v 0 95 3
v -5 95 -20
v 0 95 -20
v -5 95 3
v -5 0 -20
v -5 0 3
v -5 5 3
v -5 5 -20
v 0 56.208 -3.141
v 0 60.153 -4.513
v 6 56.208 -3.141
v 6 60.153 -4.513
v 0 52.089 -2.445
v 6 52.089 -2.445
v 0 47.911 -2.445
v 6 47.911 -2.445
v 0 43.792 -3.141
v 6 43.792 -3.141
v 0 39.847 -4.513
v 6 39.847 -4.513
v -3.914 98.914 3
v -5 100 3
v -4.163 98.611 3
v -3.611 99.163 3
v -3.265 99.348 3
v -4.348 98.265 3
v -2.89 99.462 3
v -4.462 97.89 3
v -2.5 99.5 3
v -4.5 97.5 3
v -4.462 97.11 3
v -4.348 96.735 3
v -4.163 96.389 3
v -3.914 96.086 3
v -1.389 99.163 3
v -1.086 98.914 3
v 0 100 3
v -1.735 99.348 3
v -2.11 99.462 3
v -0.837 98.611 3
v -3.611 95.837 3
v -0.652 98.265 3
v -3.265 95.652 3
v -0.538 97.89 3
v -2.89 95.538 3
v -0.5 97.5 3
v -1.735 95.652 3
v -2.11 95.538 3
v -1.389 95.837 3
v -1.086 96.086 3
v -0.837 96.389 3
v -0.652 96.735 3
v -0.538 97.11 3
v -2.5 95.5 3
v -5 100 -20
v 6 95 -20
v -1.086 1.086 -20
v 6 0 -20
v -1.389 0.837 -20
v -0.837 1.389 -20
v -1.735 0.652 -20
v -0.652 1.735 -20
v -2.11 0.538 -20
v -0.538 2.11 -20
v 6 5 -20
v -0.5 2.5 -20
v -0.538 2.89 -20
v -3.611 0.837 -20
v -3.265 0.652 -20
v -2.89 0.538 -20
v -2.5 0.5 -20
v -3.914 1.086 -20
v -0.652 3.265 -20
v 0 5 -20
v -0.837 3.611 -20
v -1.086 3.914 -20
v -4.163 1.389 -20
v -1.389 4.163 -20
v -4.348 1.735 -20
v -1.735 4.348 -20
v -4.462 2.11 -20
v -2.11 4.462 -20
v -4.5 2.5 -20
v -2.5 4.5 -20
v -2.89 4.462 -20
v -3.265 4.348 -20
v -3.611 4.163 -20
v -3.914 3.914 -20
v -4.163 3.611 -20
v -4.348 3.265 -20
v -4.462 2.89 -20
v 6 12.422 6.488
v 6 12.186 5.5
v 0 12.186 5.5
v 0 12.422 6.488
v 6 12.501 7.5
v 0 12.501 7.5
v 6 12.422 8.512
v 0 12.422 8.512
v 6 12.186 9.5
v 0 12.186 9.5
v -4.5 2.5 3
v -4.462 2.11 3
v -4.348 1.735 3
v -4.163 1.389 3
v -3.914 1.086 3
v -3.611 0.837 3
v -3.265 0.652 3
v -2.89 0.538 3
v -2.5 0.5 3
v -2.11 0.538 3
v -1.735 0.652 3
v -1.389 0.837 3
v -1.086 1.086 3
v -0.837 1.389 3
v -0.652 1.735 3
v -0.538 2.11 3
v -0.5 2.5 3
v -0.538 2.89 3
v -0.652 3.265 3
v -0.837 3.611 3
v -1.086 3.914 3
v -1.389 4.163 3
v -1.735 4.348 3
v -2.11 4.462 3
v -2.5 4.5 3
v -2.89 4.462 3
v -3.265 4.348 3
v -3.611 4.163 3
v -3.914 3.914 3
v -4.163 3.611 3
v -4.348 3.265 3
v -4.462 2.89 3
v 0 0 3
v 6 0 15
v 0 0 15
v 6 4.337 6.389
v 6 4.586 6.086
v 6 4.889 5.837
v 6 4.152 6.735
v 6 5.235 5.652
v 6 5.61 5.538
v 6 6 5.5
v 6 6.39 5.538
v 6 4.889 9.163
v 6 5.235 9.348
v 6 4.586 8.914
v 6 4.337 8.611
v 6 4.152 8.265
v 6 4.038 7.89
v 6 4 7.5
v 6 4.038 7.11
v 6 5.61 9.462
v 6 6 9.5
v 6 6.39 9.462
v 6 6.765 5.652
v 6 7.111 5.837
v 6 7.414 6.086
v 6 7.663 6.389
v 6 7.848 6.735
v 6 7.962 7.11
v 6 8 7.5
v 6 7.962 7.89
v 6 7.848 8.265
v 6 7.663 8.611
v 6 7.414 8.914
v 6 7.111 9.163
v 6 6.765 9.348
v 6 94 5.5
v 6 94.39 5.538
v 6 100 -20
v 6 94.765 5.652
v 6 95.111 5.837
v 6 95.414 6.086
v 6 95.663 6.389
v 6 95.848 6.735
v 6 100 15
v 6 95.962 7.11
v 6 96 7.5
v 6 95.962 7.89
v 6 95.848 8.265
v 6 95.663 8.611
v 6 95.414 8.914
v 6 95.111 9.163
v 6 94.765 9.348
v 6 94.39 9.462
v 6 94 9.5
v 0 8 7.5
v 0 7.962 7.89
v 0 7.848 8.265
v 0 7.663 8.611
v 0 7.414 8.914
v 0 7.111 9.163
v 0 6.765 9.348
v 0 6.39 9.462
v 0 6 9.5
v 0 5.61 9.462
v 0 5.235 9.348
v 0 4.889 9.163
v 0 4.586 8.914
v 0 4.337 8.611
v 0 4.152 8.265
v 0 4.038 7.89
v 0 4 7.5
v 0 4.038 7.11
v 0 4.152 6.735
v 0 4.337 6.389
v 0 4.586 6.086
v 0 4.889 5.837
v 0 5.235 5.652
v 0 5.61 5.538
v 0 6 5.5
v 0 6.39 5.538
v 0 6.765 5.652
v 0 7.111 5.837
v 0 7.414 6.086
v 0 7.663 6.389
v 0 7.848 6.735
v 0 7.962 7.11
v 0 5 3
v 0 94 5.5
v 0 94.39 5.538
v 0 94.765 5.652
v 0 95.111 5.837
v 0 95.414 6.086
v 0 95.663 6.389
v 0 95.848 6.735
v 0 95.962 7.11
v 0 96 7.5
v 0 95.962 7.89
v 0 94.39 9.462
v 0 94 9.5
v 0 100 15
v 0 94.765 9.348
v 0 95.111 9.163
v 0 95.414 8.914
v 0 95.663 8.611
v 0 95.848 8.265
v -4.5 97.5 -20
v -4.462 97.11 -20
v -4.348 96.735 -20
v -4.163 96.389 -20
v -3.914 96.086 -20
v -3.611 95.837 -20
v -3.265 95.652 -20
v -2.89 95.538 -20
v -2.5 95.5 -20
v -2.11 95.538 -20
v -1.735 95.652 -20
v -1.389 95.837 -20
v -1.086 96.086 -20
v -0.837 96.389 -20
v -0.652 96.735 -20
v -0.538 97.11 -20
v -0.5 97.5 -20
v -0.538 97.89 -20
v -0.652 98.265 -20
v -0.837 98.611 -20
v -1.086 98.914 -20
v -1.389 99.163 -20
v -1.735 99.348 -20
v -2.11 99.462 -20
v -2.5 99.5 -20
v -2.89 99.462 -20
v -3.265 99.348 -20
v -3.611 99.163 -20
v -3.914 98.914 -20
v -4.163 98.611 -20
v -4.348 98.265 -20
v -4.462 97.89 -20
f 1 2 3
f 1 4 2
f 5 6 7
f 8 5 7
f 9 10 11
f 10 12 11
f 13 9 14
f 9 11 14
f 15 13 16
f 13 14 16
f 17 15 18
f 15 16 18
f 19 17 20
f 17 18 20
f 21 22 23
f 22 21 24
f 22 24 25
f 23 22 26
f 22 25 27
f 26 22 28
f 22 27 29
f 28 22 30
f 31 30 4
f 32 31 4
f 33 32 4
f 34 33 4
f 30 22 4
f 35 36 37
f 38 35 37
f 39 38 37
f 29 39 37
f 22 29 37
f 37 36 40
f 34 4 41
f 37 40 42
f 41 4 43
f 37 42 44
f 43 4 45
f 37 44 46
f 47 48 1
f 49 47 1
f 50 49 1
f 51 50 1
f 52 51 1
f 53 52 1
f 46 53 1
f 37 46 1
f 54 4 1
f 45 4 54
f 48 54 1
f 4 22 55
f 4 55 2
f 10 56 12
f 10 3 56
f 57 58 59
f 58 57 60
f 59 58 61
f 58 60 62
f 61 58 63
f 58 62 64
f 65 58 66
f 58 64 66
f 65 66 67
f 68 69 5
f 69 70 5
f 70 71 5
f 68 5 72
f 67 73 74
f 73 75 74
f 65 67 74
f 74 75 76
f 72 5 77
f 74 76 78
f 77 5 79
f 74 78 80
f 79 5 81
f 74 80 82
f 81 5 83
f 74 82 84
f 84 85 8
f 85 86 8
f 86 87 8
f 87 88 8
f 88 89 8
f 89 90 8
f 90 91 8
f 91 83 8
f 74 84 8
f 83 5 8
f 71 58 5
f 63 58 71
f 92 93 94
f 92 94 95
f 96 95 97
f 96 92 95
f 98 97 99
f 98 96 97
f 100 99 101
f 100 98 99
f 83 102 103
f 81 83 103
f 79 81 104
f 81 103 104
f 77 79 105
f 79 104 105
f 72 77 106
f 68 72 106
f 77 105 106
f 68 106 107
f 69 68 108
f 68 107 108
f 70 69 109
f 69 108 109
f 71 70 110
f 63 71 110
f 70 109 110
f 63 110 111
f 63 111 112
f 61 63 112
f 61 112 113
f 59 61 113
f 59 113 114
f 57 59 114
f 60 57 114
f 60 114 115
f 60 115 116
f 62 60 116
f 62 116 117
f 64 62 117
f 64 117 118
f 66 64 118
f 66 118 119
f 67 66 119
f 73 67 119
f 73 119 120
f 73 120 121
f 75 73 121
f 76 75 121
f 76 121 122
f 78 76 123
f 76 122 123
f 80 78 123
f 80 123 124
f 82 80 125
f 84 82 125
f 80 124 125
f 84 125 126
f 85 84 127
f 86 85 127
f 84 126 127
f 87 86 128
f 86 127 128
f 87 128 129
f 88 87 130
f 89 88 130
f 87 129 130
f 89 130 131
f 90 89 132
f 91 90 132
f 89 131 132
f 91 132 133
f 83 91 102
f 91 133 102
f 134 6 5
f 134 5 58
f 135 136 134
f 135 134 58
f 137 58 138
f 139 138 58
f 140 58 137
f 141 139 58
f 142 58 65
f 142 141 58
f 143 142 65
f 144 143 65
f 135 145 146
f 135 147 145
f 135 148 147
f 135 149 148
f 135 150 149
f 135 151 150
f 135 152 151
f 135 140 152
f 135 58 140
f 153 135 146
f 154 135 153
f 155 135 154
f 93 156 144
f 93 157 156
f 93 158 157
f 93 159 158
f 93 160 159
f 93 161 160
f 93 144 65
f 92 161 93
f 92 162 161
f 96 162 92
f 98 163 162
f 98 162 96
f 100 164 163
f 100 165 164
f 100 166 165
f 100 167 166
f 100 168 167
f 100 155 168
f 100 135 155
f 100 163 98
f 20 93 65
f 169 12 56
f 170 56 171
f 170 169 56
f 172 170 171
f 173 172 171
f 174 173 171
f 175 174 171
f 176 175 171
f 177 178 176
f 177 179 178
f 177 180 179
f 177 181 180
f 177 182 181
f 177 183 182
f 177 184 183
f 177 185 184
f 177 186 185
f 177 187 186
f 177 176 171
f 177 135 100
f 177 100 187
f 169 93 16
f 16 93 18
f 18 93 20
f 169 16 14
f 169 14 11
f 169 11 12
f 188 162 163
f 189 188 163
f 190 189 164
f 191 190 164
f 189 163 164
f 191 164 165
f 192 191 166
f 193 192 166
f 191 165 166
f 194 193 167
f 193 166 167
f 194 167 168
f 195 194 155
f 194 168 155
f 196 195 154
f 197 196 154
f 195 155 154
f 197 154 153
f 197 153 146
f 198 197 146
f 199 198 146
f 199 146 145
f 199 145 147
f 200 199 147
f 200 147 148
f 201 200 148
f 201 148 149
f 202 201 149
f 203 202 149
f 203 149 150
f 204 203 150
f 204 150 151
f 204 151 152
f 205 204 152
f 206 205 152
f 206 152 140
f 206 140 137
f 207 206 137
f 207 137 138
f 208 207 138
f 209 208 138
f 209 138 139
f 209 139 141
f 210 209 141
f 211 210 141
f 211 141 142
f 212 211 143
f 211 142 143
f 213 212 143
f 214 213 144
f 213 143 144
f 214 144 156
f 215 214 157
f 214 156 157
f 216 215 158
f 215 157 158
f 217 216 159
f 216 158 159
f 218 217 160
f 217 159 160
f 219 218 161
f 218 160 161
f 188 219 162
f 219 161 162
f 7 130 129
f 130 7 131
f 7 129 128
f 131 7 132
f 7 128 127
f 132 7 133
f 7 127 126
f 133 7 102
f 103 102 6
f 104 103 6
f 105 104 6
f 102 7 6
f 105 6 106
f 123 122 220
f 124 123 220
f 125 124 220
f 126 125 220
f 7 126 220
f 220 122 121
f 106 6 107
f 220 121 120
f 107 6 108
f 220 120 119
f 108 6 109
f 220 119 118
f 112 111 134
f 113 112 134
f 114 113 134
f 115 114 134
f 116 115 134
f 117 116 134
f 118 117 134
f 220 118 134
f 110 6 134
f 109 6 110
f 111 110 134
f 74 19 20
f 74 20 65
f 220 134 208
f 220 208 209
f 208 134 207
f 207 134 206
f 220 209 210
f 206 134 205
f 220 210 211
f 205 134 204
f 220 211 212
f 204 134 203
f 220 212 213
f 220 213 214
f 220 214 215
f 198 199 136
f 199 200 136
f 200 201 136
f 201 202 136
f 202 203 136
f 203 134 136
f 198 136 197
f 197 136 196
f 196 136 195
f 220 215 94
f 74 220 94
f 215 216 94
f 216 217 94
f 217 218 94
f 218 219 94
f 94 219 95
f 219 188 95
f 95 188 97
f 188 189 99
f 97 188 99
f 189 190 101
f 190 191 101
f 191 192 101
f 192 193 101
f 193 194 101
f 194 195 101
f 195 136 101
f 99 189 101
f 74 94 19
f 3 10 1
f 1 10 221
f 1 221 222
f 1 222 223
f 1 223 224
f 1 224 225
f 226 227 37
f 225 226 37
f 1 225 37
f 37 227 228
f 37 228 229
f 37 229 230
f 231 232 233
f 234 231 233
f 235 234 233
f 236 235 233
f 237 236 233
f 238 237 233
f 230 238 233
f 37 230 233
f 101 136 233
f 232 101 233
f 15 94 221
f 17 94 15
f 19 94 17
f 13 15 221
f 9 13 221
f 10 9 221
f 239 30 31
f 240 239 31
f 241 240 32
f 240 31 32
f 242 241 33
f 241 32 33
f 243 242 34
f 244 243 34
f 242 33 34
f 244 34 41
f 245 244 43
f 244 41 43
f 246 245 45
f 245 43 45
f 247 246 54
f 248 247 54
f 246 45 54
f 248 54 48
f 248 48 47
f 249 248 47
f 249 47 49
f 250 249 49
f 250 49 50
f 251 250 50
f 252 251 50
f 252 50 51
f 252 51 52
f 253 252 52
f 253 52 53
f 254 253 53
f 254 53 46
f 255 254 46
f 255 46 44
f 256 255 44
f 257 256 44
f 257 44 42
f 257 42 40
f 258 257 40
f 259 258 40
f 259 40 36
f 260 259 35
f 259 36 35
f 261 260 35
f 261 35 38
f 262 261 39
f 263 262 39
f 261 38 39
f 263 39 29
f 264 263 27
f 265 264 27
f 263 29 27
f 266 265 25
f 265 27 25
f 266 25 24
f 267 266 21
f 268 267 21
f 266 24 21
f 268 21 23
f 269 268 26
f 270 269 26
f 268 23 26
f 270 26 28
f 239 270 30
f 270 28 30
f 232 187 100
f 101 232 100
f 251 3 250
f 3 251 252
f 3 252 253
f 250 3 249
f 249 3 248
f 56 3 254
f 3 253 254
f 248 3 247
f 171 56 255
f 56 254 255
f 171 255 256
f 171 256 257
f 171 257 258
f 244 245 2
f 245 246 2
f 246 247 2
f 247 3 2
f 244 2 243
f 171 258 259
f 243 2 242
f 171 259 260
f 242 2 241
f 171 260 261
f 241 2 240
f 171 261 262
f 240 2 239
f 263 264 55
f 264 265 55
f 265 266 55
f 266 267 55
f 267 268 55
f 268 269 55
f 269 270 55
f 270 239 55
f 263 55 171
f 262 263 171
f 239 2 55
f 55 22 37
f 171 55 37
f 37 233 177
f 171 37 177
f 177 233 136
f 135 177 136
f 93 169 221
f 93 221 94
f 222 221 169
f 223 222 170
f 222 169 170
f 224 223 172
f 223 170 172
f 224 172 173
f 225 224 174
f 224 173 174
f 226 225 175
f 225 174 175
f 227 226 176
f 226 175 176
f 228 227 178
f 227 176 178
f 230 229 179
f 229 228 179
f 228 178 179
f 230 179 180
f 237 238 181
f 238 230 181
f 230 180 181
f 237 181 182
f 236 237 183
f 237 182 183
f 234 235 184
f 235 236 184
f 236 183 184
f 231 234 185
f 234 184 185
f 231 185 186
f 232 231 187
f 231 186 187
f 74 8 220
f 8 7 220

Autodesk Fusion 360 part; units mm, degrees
sketch "Sketch1" plane through (0, 0, 0) normal (1, 0, 0) x (0, 1, 0)
  line L0 (0, 0) -> (100, 0)
  line L1 (100, 0) -> (100, 15)
  line L2 (100, 15) -> (0, 15)
  line L3 (0, 15) -> (0, 0)
  dimension "d1" = 100
  dimension "d2" = 15
extrude "Extrude1" add sketch "Sketch1" along normal blind 6
sketch "Sketch2" plane through (6, 0, 0) normal (1, 0, 0) x (0, 1, 0)
  line L0 (0, 15) -> (0, 0)
  line L1 (0, 0) -> (100, 0)
  line L2 (100, 0) -> (100, 15)
  line L3 (100, 15) -> (0, 15)
  circle A0 centre (6, 7.5) radius 4
  circle A1 centre (94, 7.5) radius 4
  line L4 (6, 11.5) -> (94, 11.5)
  line L5 (94, 3.5) -> (6, 3.5)
  circle A2 centre (6, 7.5) radius 6.5013
  dimension "d5" = 8
  dimension "d6" = 6
  dimension "d7" = 8
  dimension "d8" = 6
extrude "Extrude2" cut sketch "Sketch2" against normal blind 20 contours A1 L4 L5 A2 | A0 | A1
sketch "Sketch3" plane through (0, 0, 0) normal (-1, 0, 0) x (0, -1, 0)
  line L0 (-11.1251, 3.5) -> (-94, 3.5)
  arc A0 (-94, 11.5) -> (-94, 3.5) centre (-94, 7.5) ccw
  line L1 (-94, 11.5) -> (-11.1251, 11.5)
  line L2 (0, 0) -> (0, 15)
  line L3 (0, 15) -> (-100, 15)
  line L4 (-100, 15) -> (-100, 0)
  line L5 (-100, 0) -> (0, 0)
  circle A1 centre (-6, 7.5) radius 4
  arc A2 (-11.1251, 11.5) -> (-11.1251, 3.5) centre (-6, 7.5) ccw
sketch "Sketch4" plane through (0, 50, 7.5) normal (-1, 0, 0) x (0, -1, 0)
sketch "Sketch5" plane through (0, 0, 0) normal (0, 0, -1) x (1, 0, 0)
  line L0 (0, 0) -> (0, -100)
  line L1 (0, -100) -> (6, -100)
  line L2 (6, -100) -> (6, 0)
  line L3 (6, 0) -> (0, 0)
  line L4 (0, -100) -> (-5, -100)
  line L5 (-5, -100) -> (-5, -95)
  line L6 (-5, -95) -> (0, -95)
  line L7 (0, -95) -> (0, -100)
  line L8 (0, 0) -> (-5, 0)
  line L9 (-5, 0) -> (-5, -5)
  line L10 (-5, -5) -> (0, -5)
  line L11 (0, -5) -> (0, 0)
  dimension "d11" = 5
  dimension "d12" = 5
  dimension "d13" = 5
  dimension "d14" = 5
extrude "Extrude3" add sketch "Sketch5" against normal blind 3 contours L0 L8 L9 L10 L11 | L0 L4 L5 L6 L7
sketch "Sketch6" plane through (0, 0, 3) normal (0, 0, 1) x (-1, 0, 0)
  line L0 (5, -95) -> (0, -95)
  line L1 (0, -95) -> (0, -100)
  line L2 (0, -100) -> (5, -100)
  line L3 (5, -100) -> (5, -95)
  circle A0 centre (2.5, -97.5) radius 2
  dimension "d17" = 4
extrude "Extrude4" cut sketch "Sketch6" against normal blind 6 contours A0
sketch "Sketch7" plane through (0, 0, 0) normal (-1, 0, 0) x (0, -1, 0)
sketch "Sketch8" plane through (0, 0, 3) normal (0, 0, 1) x (-1, 0, 0)
  line L0 (0, 0) -> (0, -5)
  line L1 (0, -5) -> (5, -5)
  line L2 (5, -5) -> (5, 0)
  line L3 (5, 0) -> (0, 0)
  circle A0 centre (2.5, -2.5) radius 2
  dimension "d20" = 4
extrude "Extrude5" cut sketch "Sketch8" against normal blind 9 contours A0
sketch "Sketch9" plane through (0, 50.3094, 7.5) normal (-1, 0, 0) x (0, -1, 0)
extrude "Extrude6" add 1 faces at (4, 65, 0) along direction (0, 0, -1) blind 20
sketch "Sketch10" plane through (0, 0, 0) normal (-1, 0, 0) x (0, -1, 0)
  line L0 (-5, 3) -> (0, 3)
  line L1 (0, 3) -> (0, 15)
  line L2 (0, 15) -> (-100, 15)
  line L3 (-100, 15) -> (-100, 3)
  line L4 (-100, 3) -> (-95, 3)
  line L5 (-95, 3) -> (-95, -20)
  line L6 (-95, -20) -> (-5, -20)
  line L7 (-5, -20) -> (-5, 3)
  circle A0 centre (-6, 7.5) radius 4
  line L8 (-94, 11.5) -> (-11.1251, 11.5)
  arc A1 (-11.1251, 11.5) -> (-11.1251, 3.5) centre (-6, 7.5) ccw
  line L9 (-11.1251, 3.5) -> (-94, 3.5)
  arc A2 (-94, 11.5) -> (-94, 3.5) centre (-94, 7.5) ccw
  line L10 (-95, -20) -> (-50, 0)
  line L11 (-50, 0) -> (-5, -20)
extrude "Extrude7" cut sketch "Sketch10" against normal blind 25 contours L6 L10 L11
fillet "Fillet1" radius 25 1 edges at (3, 50, 0)
sketch "Sketch11" plane through (6, 0, 0) normal (1, 0, 0) x (0, 1, 0)
  line L0 (5, -20) -> (39.8465, -4.5126)
  arc A0 (60.1535, -4.5126) -> (39.8465, -4.5126) centre (50, -27.3579) ccw
  line L1 (60.1535, -4.5126) -> (95, -20)
  line L2 (95, -20) -> (100, -20)
  line L3 (100, -20) -> (100, 15)
  line L4 (100, 15) -> (0, 15)
  line L5 (0, 15) -> (0, -20)
  line L6 (0, -20) -> (5, -20)
  line L7 (11.1251, 11.5) -> (94, 11.5)
  arc A1 (94, 3.5) -> (94, 11.5) centre (94, 7.5) ccw
  line L8 (94, 3.5) -> (11.1251, 3.5)
  arc A2 (11.1251, 3.5) -> (11.1251, 11.5) centre (6, 7.5) ccw
  circle A3 centre (6, 7.5) radius 4
  circle A4 centre (6, 7.5) radius 2
  circle A5 centre (94, 7.5) radius 2
  line L9 (94, 9.5) -> (12.186, 9.5)
  line L10 (94, 5.5) -> (12.186, 5.5)
  dimension "d29" = 4
  dimension "d30" = 4
extrude "Extrude8" add sketch "Sketch11" against normal blind 6 contours L7 A1 L8 A2 A5 L9 L10 | A3
